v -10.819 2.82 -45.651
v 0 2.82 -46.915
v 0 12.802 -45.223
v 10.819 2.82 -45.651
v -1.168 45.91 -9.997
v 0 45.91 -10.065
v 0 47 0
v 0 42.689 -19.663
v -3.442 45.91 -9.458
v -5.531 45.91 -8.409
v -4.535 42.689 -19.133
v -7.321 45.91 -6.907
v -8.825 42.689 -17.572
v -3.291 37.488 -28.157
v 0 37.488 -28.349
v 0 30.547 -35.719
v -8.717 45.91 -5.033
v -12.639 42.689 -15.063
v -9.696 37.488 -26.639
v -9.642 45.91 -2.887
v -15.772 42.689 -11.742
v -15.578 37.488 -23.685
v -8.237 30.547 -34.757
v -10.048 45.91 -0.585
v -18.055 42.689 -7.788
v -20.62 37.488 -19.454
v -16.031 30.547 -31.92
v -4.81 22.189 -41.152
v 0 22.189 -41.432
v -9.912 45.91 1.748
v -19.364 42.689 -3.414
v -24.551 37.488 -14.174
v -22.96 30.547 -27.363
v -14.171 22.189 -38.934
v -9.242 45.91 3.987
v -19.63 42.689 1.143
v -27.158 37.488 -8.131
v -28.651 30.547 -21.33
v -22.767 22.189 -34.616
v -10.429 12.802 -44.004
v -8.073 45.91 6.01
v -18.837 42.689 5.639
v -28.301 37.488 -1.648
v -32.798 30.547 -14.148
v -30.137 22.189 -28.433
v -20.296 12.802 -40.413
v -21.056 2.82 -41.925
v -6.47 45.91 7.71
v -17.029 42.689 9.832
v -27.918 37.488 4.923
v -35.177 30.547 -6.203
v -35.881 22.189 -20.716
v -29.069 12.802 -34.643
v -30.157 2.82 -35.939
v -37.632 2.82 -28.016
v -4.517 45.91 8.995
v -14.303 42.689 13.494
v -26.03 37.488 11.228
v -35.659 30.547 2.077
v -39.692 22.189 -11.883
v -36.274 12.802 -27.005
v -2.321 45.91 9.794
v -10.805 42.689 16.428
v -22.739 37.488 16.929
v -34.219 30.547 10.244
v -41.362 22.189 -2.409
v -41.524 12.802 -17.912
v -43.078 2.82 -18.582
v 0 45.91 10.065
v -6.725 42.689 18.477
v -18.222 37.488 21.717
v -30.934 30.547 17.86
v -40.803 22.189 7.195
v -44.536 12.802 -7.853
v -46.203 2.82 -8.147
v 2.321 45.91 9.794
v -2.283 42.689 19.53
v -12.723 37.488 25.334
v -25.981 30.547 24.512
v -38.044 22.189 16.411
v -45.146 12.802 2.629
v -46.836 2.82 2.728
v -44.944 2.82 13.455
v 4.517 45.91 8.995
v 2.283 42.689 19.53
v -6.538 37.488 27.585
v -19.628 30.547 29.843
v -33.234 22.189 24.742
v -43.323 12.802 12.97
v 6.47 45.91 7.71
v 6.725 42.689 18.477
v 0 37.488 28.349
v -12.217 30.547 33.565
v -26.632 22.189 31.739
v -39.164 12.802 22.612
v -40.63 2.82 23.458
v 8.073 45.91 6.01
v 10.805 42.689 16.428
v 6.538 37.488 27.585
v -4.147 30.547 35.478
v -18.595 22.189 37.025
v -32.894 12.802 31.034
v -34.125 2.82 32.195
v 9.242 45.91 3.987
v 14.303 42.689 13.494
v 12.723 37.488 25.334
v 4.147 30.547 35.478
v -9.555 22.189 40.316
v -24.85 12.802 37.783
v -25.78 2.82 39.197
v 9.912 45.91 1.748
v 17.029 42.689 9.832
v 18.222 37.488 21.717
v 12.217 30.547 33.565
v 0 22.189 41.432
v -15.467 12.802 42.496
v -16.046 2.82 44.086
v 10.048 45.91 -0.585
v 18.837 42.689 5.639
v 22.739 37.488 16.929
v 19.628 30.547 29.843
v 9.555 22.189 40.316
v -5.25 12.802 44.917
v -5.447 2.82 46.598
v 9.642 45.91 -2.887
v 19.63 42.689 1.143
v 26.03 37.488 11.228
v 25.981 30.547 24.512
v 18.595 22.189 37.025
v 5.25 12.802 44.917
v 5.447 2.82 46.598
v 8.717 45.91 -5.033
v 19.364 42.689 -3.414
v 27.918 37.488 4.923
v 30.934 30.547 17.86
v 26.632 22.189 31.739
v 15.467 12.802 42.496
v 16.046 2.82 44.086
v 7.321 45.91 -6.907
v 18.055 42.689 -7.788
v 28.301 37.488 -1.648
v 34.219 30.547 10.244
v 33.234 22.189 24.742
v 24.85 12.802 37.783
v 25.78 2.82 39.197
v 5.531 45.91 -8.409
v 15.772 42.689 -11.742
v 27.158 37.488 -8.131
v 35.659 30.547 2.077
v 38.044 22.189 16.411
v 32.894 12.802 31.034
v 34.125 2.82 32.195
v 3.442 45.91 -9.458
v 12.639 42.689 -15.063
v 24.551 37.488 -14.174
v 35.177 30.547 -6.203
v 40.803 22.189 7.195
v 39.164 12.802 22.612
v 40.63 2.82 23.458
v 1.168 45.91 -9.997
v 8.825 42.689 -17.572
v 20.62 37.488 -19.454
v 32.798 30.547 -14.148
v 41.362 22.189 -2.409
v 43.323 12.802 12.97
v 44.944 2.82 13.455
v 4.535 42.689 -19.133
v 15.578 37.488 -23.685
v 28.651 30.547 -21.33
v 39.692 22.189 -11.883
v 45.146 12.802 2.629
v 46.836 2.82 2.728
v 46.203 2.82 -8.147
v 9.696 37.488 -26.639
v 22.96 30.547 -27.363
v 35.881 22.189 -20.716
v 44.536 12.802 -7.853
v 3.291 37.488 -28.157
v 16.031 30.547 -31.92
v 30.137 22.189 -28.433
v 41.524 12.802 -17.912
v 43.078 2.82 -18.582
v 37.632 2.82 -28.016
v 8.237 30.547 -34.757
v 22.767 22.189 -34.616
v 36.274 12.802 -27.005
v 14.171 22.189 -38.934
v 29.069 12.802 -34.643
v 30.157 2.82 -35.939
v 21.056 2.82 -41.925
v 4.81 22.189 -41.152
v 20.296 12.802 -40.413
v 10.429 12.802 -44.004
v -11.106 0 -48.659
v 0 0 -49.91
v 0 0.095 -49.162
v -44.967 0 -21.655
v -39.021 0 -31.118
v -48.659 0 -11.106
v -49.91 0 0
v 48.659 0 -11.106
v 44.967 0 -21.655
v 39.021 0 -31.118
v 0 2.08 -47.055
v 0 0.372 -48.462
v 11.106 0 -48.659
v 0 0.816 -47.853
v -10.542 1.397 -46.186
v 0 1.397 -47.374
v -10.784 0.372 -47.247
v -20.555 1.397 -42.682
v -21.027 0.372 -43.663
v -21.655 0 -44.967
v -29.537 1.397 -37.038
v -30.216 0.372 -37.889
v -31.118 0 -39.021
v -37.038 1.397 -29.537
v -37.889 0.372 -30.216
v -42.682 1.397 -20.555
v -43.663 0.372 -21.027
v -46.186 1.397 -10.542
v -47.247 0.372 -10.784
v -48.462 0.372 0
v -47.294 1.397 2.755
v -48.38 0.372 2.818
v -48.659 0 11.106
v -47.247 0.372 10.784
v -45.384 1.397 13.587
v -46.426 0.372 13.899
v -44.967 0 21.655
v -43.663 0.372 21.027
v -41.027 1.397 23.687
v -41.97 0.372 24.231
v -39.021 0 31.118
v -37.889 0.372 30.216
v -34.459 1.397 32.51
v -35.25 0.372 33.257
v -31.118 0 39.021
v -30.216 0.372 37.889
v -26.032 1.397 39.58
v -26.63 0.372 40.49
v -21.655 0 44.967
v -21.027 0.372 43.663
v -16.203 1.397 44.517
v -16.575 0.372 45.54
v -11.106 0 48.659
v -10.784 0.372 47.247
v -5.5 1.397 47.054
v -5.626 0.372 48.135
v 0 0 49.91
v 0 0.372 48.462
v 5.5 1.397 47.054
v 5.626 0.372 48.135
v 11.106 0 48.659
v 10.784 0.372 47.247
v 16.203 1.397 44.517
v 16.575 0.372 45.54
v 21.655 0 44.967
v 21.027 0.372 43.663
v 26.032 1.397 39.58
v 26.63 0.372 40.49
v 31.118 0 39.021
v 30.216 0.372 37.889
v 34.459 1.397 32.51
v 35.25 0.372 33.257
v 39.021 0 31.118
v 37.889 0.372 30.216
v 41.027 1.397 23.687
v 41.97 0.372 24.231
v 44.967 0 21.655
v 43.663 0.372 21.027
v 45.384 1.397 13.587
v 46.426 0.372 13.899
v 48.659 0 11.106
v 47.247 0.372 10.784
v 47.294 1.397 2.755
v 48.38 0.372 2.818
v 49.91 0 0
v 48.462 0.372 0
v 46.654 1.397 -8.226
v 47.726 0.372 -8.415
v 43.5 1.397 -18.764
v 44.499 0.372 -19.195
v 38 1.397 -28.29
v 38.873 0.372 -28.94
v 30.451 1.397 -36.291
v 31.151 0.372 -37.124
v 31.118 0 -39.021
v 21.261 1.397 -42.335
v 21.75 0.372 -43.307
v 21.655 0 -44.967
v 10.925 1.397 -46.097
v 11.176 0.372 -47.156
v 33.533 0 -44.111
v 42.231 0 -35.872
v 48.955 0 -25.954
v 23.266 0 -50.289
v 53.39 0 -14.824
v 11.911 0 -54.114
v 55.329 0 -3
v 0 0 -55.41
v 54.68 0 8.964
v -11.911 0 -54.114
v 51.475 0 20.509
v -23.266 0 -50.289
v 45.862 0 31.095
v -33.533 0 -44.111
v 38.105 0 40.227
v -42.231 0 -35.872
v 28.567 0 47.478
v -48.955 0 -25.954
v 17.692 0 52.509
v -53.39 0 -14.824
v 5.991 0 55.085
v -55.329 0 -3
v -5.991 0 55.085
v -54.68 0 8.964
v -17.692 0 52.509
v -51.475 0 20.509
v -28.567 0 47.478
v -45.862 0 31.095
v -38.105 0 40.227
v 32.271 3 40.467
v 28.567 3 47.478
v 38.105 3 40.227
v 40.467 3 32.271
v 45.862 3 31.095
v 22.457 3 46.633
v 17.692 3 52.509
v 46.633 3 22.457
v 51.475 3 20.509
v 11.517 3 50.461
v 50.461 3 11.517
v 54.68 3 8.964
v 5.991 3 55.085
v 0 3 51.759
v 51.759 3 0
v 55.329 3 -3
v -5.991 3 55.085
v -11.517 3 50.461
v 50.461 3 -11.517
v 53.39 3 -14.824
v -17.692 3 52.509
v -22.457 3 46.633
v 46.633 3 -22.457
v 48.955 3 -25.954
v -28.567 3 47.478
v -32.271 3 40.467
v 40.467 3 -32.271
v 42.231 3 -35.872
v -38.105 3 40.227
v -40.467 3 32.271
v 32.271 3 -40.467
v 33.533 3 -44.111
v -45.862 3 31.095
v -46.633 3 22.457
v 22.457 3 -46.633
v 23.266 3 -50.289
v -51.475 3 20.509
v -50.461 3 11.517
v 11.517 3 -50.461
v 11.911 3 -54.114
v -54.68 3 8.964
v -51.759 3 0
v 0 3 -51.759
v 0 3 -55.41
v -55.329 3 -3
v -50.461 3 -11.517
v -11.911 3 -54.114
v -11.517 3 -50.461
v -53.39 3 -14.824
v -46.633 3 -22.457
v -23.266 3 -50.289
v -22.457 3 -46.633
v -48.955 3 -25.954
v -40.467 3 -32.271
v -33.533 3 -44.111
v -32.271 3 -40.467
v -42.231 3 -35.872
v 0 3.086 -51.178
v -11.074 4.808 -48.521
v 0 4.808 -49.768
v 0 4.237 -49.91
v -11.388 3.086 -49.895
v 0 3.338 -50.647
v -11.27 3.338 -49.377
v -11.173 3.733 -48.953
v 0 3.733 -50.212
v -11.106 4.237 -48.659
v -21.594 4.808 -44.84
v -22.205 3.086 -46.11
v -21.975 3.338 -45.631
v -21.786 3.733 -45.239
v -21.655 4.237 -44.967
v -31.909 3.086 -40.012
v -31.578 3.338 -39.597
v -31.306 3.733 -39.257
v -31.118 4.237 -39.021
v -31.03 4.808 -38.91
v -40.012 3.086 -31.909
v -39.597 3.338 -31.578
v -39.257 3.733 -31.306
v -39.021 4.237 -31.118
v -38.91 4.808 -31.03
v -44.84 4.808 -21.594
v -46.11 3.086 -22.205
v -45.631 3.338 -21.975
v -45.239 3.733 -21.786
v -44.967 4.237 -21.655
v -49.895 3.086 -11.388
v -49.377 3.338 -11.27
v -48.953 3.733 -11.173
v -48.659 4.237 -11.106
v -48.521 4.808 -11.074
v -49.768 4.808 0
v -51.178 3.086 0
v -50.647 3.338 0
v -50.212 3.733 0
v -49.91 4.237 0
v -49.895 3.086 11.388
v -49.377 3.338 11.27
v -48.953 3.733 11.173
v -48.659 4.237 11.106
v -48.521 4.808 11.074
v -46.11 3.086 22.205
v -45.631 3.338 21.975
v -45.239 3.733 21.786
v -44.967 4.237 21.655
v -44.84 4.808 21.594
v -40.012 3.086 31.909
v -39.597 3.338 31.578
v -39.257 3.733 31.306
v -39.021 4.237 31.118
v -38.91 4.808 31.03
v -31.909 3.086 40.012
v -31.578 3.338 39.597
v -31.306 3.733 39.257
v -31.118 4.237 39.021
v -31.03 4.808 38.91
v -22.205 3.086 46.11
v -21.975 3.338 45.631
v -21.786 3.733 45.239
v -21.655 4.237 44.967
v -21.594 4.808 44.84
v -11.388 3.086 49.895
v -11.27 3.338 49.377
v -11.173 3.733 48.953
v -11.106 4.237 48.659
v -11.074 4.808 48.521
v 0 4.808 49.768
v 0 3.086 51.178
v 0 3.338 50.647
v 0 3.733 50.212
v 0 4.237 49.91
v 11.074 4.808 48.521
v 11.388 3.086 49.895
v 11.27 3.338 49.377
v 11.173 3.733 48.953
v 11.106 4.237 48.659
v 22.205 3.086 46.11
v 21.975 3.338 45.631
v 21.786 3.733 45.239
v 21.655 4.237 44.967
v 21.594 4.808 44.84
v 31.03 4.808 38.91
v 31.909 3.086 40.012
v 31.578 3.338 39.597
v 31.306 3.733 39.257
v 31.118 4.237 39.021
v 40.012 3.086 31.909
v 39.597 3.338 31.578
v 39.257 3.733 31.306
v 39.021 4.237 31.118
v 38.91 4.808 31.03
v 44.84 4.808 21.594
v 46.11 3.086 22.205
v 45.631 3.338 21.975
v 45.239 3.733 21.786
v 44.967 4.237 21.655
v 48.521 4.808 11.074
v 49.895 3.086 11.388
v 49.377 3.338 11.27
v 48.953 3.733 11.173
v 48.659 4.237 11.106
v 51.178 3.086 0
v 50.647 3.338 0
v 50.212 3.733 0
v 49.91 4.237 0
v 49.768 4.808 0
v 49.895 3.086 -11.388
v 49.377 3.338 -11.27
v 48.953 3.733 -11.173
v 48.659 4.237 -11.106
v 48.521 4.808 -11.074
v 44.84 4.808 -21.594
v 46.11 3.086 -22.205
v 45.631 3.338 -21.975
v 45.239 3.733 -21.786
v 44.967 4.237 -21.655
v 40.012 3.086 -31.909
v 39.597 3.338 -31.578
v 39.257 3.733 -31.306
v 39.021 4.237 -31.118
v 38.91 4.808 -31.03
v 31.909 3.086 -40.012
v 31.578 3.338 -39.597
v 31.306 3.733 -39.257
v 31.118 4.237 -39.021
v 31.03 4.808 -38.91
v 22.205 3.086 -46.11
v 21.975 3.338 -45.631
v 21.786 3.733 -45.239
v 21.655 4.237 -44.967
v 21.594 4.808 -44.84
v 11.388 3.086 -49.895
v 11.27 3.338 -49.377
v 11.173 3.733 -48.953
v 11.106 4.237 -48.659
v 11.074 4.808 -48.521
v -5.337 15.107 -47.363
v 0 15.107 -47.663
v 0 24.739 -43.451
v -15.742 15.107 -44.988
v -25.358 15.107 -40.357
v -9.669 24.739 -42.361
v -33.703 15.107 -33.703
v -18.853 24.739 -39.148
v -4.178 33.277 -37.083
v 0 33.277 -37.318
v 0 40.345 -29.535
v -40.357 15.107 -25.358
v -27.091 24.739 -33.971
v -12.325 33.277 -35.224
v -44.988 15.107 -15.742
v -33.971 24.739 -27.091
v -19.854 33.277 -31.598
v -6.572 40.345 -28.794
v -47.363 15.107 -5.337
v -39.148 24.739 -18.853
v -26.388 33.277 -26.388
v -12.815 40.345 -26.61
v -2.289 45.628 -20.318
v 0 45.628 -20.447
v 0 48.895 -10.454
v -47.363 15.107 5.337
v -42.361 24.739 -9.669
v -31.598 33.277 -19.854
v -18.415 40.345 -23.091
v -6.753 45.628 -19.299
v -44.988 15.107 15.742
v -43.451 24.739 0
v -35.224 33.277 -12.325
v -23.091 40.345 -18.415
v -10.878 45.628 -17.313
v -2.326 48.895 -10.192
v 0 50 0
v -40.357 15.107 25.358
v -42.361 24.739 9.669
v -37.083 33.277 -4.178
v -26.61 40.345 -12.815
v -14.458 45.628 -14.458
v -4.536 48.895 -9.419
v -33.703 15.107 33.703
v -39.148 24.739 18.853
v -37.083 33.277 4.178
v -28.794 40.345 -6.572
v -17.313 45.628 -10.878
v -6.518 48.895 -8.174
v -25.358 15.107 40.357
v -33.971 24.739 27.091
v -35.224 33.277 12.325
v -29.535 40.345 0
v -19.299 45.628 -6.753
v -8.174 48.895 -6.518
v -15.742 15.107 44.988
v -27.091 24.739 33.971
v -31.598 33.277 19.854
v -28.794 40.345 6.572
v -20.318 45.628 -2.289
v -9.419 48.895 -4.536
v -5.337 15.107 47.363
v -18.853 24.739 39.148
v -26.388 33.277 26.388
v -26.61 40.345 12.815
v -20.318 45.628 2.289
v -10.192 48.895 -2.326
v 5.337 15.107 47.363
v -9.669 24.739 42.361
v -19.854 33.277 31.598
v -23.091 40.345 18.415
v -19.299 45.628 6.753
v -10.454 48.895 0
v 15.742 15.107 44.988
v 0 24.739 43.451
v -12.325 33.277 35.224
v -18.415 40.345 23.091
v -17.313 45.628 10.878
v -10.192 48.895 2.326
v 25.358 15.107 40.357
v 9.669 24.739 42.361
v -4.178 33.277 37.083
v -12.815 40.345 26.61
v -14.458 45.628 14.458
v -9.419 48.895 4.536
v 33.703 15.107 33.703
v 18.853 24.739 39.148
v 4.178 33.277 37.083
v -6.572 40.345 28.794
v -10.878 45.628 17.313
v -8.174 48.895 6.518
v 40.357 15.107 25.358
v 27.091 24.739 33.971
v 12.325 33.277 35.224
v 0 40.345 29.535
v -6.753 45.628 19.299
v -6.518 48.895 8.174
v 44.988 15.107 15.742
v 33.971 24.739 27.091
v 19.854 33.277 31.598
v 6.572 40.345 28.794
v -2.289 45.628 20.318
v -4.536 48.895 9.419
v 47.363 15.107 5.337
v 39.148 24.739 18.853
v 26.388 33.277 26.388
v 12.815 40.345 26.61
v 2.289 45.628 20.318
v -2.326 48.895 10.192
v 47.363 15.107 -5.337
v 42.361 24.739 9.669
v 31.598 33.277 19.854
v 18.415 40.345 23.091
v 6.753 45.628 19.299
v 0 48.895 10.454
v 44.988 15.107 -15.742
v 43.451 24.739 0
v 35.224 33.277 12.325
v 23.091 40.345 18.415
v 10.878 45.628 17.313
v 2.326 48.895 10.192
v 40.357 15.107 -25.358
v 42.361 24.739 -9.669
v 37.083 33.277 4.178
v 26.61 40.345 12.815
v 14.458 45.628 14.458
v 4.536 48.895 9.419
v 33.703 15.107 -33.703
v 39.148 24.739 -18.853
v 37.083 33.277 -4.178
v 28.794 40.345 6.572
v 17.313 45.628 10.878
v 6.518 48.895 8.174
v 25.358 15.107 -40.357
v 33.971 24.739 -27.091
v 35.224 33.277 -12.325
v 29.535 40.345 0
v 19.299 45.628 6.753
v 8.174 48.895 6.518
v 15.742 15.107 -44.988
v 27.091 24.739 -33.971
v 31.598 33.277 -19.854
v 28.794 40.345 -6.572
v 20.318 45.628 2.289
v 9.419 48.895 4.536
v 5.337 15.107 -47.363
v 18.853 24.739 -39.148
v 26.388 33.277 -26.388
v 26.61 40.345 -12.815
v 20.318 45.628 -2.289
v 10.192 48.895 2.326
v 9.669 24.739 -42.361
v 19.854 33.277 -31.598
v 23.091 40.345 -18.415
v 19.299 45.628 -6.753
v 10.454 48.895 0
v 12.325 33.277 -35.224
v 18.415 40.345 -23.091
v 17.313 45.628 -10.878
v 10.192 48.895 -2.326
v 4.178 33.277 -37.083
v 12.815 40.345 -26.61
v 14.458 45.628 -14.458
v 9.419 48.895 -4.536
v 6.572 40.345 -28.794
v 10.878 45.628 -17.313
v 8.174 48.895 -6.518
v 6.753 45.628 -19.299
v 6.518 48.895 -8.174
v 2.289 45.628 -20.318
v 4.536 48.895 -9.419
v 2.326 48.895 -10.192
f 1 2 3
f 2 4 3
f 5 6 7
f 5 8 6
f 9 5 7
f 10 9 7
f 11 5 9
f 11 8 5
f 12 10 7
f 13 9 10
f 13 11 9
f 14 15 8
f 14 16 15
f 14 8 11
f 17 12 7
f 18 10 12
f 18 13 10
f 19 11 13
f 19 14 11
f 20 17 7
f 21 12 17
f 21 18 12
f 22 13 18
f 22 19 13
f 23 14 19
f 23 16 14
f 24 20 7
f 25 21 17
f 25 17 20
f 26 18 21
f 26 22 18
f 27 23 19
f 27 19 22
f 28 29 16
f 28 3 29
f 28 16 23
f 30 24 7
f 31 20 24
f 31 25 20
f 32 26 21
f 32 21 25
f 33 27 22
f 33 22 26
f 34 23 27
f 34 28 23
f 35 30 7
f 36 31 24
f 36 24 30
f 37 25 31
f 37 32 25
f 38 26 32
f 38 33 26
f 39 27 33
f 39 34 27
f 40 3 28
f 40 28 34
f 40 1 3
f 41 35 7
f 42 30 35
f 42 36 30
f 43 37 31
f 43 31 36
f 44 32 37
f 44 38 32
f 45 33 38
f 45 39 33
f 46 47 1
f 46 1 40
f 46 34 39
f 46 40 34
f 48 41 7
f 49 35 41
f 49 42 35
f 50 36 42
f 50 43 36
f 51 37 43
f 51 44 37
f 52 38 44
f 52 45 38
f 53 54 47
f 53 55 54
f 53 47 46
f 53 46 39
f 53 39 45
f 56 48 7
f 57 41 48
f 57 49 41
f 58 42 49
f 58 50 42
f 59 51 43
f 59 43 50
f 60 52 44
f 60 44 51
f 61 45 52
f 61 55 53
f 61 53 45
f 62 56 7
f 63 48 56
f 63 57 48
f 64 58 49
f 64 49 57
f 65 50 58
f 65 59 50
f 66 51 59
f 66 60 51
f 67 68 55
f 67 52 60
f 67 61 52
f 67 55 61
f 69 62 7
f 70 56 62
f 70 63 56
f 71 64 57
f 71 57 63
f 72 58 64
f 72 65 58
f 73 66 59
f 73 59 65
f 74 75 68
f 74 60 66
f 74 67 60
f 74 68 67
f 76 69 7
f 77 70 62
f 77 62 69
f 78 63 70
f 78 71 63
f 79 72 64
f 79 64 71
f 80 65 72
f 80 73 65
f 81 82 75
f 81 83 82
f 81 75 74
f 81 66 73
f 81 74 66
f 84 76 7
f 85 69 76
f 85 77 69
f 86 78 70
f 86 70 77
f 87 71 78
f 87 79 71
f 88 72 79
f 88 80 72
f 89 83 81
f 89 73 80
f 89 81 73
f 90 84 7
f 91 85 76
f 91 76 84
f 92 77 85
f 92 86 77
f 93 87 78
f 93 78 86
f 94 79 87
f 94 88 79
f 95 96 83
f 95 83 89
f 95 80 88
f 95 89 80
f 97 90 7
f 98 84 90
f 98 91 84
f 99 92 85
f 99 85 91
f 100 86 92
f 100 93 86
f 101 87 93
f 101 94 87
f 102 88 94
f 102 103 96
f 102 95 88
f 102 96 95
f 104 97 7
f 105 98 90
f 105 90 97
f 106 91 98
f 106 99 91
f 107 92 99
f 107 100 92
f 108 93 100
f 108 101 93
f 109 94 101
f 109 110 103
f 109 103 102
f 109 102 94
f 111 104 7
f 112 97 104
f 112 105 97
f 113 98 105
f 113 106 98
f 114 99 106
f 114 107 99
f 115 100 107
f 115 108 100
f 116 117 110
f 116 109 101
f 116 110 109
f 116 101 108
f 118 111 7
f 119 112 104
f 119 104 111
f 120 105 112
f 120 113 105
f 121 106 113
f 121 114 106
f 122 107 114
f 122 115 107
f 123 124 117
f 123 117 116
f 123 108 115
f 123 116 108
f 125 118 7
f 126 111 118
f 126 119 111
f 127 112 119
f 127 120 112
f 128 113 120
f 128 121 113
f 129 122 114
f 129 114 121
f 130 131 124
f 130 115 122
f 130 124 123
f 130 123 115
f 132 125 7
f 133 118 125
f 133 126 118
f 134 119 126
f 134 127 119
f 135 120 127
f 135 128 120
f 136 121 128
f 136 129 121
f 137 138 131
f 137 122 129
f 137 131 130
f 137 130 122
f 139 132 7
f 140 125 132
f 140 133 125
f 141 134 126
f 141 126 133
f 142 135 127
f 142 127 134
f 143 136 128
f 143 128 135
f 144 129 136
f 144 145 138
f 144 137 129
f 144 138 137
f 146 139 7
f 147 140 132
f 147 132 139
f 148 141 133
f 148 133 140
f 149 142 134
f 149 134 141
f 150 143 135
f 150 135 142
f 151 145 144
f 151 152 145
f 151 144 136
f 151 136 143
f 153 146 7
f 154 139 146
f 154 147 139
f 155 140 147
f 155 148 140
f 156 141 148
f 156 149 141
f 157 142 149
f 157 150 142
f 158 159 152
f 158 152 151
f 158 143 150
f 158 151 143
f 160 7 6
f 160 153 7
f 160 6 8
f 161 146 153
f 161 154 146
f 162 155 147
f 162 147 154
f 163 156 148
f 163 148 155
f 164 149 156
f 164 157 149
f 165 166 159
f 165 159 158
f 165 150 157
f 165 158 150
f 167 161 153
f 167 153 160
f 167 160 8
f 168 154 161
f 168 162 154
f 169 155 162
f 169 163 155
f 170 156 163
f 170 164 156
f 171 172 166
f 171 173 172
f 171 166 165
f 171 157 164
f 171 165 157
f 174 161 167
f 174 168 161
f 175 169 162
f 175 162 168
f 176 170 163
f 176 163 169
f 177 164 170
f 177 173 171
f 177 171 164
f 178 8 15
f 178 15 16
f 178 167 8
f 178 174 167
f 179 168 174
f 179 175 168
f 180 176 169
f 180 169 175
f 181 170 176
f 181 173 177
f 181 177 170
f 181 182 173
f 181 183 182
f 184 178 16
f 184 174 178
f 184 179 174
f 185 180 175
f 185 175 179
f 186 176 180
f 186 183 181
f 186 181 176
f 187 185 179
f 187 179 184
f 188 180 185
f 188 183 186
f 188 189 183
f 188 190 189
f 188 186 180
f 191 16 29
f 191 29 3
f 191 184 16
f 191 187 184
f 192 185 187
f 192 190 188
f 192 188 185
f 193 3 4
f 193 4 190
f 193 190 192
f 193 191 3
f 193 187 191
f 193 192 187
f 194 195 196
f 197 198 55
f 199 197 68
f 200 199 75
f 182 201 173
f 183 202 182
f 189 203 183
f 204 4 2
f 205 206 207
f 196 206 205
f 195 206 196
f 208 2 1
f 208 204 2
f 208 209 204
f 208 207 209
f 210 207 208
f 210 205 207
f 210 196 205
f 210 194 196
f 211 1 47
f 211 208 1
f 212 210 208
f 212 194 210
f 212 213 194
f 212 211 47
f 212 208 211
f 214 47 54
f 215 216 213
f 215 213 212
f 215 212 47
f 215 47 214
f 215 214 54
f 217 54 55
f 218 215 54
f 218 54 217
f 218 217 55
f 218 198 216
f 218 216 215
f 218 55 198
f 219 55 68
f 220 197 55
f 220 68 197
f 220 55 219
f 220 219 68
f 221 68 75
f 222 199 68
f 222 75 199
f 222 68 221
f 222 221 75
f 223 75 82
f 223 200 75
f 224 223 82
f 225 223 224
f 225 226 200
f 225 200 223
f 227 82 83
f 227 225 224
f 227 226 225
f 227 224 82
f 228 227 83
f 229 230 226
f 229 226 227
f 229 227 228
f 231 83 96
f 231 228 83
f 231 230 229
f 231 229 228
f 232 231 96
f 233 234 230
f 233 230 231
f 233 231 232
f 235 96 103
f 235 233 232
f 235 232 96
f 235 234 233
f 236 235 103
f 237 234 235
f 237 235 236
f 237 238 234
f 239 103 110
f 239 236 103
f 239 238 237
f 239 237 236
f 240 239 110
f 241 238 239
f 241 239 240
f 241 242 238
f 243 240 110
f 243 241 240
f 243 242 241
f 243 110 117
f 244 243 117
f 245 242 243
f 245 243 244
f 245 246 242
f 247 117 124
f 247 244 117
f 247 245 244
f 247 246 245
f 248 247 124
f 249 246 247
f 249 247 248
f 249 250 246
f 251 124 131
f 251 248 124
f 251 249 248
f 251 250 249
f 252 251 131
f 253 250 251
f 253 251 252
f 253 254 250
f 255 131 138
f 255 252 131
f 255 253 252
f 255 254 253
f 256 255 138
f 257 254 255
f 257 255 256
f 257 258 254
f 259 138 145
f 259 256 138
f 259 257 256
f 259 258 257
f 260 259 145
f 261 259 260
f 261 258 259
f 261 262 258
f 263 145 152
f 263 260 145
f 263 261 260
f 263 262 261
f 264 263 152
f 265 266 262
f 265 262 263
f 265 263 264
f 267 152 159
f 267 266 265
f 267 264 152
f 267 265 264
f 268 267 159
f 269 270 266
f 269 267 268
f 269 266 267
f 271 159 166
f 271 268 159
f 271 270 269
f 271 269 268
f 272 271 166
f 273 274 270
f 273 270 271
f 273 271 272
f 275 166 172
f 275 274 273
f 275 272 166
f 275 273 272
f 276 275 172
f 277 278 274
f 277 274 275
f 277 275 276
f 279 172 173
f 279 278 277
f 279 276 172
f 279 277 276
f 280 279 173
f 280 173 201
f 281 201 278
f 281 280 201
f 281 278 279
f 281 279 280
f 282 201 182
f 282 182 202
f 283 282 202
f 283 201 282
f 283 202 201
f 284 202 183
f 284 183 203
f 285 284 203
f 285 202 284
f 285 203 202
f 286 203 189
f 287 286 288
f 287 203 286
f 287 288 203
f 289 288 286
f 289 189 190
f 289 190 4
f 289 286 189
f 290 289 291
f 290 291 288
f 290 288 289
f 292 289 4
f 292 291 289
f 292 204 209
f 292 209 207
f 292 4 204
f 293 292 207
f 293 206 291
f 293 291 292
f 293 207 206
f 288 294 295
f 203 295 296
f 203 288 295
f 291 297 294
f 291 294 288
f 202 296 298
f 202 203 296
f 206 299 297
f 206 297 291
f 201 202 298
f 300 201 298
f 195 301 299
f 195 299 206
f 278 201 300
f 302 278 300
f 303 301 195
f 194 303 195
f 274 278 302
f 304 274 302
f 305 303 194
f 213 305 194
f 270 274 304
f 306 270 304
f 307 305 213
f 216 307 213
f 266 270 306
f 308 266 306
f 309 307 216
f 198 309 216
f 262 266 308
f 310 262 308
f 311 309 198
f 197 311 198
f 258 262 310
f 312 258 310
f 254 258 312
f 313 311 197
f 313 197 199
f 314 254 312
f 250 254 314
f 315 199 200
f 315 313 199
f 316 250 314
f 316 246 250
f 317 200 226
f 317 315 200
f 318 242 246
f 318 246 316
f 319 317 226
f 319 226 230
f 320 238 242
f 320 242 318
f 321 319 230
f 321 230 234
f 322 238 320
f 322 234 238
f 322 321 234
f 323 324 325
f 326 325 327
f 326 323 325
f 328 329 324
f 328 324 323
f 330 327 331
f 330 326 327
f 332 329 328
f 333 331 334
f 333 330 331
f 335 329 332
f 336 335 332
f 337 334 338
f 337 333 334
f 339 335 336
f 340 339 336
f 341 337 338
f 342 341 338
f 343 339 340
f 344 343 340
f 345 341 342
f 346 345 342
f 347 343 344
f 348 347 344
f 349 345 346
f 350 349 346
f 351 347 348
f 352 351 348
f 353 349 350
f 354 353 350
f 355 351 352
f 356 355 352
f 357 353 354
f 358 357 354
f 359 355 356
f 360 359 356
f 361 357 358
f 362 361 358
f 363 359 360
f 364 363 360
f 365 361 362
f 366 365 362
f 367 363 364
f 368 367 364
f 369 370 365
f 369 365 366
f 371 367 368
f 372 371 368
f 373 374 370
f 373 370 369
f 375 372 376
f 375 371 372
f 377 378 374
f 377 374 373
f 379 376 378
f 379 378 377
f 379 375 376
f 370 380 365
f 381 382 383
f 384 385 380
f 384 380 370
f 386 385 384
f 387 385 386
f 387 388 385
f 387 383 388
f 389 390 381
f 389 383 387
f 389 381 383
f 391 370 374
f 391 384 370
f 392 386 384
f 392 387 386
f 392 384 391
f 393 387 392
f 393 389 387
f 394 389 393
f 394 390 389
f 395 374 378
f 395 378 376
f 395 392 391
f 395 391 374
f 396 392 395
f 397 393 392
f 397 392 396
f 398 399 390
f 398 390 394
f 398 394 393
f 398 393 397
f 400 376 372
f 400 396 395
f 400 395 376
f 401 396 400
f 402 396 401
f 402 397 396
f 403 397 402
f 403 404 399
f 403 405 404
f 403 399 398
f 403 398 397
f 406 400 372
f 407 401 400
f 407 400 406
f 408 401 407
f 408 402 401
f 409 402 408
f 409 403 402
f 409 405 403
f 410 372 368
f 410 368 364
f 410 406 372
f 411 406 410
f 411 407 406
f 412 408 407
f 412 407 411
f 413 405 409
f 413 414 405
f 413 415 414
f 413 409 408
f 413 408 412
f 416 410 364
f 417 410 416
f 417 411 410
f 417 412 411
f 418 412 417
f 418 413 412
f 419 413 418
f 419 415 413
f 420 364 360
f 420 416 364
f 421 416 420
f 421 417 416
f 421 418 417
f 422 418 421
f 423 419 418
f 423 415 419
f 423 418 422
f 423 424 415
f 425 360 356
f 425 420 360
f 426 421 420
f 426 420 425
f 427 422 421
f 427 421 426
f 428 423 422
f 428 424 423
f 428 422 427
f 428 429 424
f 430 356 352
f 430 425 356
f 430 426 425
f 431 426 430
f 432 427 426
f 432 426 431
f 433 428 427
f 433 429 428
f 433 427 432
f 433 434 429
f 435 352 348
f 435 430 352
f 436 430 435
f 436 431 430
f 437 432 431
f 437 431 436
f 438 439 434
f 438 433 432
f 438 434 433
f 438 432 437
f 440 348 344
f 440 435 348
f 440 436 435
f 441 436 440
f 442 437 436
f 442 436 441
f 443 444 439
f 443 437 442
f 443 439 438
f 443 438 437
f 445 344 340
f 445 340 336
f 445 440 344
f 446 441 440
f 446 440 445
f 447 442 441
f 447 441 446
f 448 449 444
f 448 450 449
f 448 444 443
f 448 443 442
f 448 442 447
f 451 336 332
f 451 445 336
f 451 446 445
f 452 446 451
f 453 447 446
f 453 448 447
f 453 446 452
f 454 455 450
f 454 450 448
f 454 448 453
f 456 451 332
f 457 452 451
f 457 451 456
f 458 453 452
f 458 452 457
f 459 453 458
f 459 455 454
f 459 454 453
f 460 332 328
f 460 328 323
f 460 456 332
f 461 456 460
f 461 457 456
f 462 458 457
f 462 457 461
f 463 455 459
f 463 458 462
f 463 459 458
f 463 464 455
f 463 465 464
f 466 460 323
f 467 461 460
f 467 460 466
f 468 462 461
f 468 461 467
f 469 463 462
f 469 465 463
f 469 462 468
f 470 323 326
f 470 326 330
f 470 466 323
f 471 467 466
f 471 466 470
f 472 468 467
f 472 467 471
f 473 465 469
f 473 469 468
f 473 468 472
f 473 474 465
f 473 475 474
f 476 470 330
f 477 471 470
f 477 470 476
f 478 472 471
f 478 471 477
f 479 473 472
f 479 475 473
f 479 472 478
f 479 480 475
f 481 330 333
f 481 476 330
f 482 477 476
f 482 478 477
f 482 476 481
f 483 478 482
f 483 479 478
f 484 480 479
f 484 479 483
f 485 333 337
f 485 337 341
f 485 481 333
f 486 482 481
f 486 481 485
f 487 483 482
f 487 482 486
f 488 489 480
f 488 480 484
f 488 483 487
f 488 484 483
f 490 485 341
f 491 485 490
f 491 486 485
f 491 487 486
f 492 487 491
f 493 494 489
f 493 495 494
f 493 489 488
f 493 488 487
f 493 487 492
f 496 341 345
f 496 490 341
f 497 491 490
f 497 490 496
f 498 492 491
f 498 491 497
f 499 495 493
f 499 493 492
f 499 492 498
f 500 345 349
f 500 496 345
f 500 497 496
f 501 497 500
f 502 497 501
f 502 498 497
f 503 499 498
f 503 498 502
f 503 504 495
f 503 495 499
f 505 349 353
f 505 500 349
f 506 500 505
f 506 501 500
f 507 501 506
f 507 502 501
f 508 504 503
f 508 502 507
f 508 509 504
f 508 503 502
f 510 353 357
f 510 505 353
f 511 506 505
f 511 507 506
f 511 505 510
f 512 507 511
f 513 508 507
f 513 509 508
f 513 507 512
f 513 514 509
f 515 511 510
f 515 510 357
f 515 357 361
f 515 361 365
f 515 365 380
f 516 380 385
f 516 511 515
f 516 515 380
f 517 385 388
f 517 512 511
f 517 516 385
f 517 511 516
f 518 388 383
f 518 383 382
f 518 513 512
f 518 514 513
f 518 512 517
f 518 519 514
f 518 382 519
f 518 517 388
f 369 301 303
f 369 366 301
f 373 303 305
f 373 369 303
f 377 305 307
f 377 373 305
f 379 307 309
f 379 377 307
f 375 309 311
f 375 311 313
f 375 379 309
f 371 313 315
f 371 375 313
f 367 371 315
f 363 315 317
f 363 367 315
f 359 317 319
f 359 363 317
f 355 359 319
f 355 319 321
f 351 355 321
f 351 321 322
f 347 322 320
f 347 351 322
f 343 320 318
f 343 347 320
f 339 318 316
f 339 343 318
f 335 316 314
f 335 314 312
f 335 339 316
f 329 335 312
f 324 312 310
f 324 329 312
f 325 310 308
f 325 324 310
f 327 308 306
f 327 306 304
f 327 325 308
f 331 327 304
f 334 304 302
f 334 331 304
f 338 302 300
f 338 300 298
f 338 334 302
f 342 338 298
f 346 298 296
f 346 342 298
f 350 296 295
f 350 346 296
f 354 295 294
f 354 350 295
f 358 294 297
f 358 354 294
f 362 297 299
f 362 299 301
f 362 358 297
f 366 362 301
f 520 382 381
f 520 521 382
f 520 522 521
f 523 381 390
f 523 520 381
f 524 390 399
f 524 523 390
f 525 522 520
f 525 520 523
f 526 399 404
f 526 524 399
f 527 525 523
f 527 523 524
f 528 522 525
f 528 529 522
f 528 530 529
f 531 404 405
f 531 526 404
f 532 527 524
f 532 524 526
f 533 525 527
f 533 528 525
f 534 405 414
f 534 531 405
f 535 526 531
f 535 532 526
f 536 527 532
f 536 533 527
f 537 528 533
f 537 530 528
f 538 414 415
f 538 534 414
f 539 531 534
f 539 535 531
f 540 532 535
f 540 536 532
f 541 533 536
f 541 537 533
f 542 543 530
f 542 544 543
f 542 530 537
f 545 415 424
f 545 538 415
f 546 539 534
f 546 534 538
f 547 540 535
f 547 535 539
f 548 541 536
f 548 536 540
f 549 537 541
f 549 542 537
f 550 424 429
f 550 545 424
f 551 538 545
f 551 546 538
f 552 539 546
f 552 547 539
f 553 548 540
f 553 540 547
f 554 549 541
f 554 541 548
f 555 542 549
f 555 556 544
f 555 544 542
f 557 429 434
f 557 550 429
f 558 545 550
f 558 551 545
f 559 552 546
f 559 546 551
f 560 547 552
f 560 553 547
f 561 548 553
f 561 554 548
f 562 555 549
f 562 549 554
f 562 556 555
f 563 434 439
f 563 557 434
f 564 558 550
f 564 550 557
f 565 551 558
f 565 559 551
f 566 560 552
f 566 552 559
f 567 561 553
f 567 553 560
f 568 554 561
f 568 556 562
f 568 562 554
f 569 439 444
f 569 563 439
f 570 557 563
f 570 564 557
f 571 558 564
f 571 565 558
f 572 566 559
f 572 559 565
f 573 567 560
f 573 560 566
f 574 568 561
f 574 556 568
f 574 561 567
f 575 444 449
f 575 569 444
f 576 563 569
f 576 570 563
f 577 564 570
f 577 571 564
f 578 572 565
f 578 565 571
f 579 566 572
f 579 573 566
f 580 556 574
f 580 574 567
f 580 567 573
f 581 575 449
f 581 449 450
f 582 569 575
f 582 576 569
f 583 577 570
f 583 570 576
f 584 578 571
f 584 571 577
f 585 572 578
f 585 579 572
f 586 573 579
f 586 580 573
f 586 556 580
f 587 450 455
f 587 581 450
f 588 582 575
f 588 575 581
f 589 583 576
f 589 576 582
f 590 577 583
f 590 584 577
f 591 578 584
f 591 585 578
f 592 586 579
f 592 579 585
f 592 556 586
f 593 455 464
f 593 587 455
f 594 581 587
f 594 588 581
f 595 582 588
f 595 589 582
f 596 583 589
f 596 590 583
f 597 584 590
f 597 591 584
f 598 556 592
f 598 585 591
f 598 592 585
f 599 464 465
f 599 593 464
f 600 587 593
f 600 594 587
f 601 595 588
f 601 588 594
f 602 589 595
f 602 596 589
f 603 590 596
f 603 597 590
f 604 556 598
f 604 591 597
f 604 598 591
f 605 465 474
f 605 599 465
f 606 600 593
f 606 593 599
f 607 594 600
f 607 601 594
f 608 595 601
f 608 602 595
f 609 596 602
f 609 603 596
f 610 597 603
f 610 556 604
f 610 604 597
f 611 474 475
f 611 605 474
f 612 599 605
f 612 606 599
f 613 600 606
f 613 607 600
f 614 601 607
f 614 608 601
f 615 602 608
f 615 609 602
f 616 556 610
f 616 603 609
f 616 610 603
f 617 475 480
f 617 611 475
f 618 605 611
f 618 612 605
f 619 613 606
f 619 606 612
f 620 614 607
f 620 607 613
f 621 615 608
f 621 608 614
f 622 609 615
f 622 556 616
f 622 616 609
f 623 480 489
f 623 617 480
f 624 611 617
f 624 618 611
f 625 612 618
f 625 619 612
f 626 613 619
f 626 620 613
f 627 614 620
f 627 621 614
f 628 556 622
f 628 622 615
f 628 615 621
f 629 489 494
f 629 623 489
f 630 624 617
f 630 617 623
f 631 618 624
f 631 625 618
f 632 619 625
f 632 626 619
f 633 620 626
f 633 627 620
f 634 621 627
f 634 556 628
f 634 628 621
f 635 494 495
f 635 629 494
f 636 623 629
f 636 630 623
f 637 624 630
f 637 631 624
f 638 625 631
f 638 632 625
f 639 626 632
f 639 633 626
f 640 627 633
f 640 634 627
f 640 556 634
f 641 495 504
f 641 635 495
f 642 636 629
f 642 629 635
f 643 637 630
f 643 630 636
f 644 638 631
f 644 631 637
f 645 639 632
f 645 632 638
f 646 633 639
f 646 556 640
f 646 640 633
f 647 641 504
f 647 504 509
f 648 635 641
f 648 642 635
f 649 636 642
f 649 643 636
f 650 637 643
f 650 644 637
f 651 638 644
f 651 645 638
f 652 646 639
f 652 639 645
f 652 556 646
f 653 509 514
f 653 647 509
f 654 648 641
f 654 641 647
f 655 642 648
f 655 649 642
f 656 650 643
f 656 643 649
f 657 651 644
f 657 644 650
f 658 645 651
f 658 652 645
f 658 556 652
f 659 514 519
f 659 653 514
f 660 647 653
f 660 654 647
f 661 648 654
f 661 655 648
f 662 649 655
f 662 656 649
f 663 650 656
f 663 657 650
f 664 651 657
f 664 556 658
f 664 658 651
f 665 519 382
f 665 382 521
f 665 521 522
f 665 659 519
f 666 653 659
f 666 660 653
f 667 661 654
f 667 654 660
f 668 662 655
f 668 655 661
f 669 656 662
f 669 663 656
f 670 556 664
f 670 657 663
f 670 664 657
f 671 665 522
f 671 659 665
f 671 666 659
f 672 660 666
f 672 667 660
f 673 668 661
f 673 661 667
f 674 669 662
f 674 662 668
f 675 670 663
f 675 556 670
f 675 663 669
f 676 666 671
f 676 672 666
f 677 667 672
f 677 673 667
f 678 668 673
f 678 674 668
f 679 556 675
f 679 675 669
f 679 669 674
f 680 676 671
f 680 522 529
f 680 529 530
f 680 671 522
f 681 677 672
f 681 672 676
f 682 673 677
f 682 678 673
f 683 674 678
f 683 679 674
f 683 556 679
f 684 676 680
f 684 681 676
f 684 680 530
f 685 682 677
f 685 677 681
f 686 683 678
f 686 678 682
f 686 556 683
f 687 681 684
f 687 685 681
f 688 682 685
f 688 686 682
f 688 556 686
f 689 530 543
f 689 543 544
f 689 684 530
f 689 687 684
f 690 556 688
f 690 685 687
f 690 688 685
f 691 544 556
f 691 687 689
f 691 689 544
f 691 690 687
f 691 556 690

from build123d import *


with BuildPart() as part:
    # Croquis1 → Revolución1 (revolve)
    with BuildSketch(Plane.XY, mode=Mode.PRIVATE) as revoluci_n1_sk:
        with BuildLine():
            Line((49.909918854, 0), (55.409918854, 0))
            Line((55.409918854, 0), (55.409918854, 3))
            Line((55.409918854, 3), (51.759057178, 3))
            ThreePointArc((51.759057178, 3), (50.414552694, 3.51935565), (49.76832421, 4.807692308))
            ThreePointArc((49.76832421, 4.807692308), (33.612612102, 37.016108759), (0, 50))
            Line((0, 50), (0, 47))
            ThreePointArc((0, 47), (32.221576622, 34.21651648), (46.915323723, 2.82))
            ThreePointArc((46.915323723, 2.82), (47.853222474, 0.815967033), (49.909918854, 0))
        make_face()
    revolve(revoluci_n1_sk.sketch.rotate(Axis((0, 0, 0), (0, 1, 0)), 90), axis=Axis((0, 0, 0), (0, 1, 0)))


solid = part.part
